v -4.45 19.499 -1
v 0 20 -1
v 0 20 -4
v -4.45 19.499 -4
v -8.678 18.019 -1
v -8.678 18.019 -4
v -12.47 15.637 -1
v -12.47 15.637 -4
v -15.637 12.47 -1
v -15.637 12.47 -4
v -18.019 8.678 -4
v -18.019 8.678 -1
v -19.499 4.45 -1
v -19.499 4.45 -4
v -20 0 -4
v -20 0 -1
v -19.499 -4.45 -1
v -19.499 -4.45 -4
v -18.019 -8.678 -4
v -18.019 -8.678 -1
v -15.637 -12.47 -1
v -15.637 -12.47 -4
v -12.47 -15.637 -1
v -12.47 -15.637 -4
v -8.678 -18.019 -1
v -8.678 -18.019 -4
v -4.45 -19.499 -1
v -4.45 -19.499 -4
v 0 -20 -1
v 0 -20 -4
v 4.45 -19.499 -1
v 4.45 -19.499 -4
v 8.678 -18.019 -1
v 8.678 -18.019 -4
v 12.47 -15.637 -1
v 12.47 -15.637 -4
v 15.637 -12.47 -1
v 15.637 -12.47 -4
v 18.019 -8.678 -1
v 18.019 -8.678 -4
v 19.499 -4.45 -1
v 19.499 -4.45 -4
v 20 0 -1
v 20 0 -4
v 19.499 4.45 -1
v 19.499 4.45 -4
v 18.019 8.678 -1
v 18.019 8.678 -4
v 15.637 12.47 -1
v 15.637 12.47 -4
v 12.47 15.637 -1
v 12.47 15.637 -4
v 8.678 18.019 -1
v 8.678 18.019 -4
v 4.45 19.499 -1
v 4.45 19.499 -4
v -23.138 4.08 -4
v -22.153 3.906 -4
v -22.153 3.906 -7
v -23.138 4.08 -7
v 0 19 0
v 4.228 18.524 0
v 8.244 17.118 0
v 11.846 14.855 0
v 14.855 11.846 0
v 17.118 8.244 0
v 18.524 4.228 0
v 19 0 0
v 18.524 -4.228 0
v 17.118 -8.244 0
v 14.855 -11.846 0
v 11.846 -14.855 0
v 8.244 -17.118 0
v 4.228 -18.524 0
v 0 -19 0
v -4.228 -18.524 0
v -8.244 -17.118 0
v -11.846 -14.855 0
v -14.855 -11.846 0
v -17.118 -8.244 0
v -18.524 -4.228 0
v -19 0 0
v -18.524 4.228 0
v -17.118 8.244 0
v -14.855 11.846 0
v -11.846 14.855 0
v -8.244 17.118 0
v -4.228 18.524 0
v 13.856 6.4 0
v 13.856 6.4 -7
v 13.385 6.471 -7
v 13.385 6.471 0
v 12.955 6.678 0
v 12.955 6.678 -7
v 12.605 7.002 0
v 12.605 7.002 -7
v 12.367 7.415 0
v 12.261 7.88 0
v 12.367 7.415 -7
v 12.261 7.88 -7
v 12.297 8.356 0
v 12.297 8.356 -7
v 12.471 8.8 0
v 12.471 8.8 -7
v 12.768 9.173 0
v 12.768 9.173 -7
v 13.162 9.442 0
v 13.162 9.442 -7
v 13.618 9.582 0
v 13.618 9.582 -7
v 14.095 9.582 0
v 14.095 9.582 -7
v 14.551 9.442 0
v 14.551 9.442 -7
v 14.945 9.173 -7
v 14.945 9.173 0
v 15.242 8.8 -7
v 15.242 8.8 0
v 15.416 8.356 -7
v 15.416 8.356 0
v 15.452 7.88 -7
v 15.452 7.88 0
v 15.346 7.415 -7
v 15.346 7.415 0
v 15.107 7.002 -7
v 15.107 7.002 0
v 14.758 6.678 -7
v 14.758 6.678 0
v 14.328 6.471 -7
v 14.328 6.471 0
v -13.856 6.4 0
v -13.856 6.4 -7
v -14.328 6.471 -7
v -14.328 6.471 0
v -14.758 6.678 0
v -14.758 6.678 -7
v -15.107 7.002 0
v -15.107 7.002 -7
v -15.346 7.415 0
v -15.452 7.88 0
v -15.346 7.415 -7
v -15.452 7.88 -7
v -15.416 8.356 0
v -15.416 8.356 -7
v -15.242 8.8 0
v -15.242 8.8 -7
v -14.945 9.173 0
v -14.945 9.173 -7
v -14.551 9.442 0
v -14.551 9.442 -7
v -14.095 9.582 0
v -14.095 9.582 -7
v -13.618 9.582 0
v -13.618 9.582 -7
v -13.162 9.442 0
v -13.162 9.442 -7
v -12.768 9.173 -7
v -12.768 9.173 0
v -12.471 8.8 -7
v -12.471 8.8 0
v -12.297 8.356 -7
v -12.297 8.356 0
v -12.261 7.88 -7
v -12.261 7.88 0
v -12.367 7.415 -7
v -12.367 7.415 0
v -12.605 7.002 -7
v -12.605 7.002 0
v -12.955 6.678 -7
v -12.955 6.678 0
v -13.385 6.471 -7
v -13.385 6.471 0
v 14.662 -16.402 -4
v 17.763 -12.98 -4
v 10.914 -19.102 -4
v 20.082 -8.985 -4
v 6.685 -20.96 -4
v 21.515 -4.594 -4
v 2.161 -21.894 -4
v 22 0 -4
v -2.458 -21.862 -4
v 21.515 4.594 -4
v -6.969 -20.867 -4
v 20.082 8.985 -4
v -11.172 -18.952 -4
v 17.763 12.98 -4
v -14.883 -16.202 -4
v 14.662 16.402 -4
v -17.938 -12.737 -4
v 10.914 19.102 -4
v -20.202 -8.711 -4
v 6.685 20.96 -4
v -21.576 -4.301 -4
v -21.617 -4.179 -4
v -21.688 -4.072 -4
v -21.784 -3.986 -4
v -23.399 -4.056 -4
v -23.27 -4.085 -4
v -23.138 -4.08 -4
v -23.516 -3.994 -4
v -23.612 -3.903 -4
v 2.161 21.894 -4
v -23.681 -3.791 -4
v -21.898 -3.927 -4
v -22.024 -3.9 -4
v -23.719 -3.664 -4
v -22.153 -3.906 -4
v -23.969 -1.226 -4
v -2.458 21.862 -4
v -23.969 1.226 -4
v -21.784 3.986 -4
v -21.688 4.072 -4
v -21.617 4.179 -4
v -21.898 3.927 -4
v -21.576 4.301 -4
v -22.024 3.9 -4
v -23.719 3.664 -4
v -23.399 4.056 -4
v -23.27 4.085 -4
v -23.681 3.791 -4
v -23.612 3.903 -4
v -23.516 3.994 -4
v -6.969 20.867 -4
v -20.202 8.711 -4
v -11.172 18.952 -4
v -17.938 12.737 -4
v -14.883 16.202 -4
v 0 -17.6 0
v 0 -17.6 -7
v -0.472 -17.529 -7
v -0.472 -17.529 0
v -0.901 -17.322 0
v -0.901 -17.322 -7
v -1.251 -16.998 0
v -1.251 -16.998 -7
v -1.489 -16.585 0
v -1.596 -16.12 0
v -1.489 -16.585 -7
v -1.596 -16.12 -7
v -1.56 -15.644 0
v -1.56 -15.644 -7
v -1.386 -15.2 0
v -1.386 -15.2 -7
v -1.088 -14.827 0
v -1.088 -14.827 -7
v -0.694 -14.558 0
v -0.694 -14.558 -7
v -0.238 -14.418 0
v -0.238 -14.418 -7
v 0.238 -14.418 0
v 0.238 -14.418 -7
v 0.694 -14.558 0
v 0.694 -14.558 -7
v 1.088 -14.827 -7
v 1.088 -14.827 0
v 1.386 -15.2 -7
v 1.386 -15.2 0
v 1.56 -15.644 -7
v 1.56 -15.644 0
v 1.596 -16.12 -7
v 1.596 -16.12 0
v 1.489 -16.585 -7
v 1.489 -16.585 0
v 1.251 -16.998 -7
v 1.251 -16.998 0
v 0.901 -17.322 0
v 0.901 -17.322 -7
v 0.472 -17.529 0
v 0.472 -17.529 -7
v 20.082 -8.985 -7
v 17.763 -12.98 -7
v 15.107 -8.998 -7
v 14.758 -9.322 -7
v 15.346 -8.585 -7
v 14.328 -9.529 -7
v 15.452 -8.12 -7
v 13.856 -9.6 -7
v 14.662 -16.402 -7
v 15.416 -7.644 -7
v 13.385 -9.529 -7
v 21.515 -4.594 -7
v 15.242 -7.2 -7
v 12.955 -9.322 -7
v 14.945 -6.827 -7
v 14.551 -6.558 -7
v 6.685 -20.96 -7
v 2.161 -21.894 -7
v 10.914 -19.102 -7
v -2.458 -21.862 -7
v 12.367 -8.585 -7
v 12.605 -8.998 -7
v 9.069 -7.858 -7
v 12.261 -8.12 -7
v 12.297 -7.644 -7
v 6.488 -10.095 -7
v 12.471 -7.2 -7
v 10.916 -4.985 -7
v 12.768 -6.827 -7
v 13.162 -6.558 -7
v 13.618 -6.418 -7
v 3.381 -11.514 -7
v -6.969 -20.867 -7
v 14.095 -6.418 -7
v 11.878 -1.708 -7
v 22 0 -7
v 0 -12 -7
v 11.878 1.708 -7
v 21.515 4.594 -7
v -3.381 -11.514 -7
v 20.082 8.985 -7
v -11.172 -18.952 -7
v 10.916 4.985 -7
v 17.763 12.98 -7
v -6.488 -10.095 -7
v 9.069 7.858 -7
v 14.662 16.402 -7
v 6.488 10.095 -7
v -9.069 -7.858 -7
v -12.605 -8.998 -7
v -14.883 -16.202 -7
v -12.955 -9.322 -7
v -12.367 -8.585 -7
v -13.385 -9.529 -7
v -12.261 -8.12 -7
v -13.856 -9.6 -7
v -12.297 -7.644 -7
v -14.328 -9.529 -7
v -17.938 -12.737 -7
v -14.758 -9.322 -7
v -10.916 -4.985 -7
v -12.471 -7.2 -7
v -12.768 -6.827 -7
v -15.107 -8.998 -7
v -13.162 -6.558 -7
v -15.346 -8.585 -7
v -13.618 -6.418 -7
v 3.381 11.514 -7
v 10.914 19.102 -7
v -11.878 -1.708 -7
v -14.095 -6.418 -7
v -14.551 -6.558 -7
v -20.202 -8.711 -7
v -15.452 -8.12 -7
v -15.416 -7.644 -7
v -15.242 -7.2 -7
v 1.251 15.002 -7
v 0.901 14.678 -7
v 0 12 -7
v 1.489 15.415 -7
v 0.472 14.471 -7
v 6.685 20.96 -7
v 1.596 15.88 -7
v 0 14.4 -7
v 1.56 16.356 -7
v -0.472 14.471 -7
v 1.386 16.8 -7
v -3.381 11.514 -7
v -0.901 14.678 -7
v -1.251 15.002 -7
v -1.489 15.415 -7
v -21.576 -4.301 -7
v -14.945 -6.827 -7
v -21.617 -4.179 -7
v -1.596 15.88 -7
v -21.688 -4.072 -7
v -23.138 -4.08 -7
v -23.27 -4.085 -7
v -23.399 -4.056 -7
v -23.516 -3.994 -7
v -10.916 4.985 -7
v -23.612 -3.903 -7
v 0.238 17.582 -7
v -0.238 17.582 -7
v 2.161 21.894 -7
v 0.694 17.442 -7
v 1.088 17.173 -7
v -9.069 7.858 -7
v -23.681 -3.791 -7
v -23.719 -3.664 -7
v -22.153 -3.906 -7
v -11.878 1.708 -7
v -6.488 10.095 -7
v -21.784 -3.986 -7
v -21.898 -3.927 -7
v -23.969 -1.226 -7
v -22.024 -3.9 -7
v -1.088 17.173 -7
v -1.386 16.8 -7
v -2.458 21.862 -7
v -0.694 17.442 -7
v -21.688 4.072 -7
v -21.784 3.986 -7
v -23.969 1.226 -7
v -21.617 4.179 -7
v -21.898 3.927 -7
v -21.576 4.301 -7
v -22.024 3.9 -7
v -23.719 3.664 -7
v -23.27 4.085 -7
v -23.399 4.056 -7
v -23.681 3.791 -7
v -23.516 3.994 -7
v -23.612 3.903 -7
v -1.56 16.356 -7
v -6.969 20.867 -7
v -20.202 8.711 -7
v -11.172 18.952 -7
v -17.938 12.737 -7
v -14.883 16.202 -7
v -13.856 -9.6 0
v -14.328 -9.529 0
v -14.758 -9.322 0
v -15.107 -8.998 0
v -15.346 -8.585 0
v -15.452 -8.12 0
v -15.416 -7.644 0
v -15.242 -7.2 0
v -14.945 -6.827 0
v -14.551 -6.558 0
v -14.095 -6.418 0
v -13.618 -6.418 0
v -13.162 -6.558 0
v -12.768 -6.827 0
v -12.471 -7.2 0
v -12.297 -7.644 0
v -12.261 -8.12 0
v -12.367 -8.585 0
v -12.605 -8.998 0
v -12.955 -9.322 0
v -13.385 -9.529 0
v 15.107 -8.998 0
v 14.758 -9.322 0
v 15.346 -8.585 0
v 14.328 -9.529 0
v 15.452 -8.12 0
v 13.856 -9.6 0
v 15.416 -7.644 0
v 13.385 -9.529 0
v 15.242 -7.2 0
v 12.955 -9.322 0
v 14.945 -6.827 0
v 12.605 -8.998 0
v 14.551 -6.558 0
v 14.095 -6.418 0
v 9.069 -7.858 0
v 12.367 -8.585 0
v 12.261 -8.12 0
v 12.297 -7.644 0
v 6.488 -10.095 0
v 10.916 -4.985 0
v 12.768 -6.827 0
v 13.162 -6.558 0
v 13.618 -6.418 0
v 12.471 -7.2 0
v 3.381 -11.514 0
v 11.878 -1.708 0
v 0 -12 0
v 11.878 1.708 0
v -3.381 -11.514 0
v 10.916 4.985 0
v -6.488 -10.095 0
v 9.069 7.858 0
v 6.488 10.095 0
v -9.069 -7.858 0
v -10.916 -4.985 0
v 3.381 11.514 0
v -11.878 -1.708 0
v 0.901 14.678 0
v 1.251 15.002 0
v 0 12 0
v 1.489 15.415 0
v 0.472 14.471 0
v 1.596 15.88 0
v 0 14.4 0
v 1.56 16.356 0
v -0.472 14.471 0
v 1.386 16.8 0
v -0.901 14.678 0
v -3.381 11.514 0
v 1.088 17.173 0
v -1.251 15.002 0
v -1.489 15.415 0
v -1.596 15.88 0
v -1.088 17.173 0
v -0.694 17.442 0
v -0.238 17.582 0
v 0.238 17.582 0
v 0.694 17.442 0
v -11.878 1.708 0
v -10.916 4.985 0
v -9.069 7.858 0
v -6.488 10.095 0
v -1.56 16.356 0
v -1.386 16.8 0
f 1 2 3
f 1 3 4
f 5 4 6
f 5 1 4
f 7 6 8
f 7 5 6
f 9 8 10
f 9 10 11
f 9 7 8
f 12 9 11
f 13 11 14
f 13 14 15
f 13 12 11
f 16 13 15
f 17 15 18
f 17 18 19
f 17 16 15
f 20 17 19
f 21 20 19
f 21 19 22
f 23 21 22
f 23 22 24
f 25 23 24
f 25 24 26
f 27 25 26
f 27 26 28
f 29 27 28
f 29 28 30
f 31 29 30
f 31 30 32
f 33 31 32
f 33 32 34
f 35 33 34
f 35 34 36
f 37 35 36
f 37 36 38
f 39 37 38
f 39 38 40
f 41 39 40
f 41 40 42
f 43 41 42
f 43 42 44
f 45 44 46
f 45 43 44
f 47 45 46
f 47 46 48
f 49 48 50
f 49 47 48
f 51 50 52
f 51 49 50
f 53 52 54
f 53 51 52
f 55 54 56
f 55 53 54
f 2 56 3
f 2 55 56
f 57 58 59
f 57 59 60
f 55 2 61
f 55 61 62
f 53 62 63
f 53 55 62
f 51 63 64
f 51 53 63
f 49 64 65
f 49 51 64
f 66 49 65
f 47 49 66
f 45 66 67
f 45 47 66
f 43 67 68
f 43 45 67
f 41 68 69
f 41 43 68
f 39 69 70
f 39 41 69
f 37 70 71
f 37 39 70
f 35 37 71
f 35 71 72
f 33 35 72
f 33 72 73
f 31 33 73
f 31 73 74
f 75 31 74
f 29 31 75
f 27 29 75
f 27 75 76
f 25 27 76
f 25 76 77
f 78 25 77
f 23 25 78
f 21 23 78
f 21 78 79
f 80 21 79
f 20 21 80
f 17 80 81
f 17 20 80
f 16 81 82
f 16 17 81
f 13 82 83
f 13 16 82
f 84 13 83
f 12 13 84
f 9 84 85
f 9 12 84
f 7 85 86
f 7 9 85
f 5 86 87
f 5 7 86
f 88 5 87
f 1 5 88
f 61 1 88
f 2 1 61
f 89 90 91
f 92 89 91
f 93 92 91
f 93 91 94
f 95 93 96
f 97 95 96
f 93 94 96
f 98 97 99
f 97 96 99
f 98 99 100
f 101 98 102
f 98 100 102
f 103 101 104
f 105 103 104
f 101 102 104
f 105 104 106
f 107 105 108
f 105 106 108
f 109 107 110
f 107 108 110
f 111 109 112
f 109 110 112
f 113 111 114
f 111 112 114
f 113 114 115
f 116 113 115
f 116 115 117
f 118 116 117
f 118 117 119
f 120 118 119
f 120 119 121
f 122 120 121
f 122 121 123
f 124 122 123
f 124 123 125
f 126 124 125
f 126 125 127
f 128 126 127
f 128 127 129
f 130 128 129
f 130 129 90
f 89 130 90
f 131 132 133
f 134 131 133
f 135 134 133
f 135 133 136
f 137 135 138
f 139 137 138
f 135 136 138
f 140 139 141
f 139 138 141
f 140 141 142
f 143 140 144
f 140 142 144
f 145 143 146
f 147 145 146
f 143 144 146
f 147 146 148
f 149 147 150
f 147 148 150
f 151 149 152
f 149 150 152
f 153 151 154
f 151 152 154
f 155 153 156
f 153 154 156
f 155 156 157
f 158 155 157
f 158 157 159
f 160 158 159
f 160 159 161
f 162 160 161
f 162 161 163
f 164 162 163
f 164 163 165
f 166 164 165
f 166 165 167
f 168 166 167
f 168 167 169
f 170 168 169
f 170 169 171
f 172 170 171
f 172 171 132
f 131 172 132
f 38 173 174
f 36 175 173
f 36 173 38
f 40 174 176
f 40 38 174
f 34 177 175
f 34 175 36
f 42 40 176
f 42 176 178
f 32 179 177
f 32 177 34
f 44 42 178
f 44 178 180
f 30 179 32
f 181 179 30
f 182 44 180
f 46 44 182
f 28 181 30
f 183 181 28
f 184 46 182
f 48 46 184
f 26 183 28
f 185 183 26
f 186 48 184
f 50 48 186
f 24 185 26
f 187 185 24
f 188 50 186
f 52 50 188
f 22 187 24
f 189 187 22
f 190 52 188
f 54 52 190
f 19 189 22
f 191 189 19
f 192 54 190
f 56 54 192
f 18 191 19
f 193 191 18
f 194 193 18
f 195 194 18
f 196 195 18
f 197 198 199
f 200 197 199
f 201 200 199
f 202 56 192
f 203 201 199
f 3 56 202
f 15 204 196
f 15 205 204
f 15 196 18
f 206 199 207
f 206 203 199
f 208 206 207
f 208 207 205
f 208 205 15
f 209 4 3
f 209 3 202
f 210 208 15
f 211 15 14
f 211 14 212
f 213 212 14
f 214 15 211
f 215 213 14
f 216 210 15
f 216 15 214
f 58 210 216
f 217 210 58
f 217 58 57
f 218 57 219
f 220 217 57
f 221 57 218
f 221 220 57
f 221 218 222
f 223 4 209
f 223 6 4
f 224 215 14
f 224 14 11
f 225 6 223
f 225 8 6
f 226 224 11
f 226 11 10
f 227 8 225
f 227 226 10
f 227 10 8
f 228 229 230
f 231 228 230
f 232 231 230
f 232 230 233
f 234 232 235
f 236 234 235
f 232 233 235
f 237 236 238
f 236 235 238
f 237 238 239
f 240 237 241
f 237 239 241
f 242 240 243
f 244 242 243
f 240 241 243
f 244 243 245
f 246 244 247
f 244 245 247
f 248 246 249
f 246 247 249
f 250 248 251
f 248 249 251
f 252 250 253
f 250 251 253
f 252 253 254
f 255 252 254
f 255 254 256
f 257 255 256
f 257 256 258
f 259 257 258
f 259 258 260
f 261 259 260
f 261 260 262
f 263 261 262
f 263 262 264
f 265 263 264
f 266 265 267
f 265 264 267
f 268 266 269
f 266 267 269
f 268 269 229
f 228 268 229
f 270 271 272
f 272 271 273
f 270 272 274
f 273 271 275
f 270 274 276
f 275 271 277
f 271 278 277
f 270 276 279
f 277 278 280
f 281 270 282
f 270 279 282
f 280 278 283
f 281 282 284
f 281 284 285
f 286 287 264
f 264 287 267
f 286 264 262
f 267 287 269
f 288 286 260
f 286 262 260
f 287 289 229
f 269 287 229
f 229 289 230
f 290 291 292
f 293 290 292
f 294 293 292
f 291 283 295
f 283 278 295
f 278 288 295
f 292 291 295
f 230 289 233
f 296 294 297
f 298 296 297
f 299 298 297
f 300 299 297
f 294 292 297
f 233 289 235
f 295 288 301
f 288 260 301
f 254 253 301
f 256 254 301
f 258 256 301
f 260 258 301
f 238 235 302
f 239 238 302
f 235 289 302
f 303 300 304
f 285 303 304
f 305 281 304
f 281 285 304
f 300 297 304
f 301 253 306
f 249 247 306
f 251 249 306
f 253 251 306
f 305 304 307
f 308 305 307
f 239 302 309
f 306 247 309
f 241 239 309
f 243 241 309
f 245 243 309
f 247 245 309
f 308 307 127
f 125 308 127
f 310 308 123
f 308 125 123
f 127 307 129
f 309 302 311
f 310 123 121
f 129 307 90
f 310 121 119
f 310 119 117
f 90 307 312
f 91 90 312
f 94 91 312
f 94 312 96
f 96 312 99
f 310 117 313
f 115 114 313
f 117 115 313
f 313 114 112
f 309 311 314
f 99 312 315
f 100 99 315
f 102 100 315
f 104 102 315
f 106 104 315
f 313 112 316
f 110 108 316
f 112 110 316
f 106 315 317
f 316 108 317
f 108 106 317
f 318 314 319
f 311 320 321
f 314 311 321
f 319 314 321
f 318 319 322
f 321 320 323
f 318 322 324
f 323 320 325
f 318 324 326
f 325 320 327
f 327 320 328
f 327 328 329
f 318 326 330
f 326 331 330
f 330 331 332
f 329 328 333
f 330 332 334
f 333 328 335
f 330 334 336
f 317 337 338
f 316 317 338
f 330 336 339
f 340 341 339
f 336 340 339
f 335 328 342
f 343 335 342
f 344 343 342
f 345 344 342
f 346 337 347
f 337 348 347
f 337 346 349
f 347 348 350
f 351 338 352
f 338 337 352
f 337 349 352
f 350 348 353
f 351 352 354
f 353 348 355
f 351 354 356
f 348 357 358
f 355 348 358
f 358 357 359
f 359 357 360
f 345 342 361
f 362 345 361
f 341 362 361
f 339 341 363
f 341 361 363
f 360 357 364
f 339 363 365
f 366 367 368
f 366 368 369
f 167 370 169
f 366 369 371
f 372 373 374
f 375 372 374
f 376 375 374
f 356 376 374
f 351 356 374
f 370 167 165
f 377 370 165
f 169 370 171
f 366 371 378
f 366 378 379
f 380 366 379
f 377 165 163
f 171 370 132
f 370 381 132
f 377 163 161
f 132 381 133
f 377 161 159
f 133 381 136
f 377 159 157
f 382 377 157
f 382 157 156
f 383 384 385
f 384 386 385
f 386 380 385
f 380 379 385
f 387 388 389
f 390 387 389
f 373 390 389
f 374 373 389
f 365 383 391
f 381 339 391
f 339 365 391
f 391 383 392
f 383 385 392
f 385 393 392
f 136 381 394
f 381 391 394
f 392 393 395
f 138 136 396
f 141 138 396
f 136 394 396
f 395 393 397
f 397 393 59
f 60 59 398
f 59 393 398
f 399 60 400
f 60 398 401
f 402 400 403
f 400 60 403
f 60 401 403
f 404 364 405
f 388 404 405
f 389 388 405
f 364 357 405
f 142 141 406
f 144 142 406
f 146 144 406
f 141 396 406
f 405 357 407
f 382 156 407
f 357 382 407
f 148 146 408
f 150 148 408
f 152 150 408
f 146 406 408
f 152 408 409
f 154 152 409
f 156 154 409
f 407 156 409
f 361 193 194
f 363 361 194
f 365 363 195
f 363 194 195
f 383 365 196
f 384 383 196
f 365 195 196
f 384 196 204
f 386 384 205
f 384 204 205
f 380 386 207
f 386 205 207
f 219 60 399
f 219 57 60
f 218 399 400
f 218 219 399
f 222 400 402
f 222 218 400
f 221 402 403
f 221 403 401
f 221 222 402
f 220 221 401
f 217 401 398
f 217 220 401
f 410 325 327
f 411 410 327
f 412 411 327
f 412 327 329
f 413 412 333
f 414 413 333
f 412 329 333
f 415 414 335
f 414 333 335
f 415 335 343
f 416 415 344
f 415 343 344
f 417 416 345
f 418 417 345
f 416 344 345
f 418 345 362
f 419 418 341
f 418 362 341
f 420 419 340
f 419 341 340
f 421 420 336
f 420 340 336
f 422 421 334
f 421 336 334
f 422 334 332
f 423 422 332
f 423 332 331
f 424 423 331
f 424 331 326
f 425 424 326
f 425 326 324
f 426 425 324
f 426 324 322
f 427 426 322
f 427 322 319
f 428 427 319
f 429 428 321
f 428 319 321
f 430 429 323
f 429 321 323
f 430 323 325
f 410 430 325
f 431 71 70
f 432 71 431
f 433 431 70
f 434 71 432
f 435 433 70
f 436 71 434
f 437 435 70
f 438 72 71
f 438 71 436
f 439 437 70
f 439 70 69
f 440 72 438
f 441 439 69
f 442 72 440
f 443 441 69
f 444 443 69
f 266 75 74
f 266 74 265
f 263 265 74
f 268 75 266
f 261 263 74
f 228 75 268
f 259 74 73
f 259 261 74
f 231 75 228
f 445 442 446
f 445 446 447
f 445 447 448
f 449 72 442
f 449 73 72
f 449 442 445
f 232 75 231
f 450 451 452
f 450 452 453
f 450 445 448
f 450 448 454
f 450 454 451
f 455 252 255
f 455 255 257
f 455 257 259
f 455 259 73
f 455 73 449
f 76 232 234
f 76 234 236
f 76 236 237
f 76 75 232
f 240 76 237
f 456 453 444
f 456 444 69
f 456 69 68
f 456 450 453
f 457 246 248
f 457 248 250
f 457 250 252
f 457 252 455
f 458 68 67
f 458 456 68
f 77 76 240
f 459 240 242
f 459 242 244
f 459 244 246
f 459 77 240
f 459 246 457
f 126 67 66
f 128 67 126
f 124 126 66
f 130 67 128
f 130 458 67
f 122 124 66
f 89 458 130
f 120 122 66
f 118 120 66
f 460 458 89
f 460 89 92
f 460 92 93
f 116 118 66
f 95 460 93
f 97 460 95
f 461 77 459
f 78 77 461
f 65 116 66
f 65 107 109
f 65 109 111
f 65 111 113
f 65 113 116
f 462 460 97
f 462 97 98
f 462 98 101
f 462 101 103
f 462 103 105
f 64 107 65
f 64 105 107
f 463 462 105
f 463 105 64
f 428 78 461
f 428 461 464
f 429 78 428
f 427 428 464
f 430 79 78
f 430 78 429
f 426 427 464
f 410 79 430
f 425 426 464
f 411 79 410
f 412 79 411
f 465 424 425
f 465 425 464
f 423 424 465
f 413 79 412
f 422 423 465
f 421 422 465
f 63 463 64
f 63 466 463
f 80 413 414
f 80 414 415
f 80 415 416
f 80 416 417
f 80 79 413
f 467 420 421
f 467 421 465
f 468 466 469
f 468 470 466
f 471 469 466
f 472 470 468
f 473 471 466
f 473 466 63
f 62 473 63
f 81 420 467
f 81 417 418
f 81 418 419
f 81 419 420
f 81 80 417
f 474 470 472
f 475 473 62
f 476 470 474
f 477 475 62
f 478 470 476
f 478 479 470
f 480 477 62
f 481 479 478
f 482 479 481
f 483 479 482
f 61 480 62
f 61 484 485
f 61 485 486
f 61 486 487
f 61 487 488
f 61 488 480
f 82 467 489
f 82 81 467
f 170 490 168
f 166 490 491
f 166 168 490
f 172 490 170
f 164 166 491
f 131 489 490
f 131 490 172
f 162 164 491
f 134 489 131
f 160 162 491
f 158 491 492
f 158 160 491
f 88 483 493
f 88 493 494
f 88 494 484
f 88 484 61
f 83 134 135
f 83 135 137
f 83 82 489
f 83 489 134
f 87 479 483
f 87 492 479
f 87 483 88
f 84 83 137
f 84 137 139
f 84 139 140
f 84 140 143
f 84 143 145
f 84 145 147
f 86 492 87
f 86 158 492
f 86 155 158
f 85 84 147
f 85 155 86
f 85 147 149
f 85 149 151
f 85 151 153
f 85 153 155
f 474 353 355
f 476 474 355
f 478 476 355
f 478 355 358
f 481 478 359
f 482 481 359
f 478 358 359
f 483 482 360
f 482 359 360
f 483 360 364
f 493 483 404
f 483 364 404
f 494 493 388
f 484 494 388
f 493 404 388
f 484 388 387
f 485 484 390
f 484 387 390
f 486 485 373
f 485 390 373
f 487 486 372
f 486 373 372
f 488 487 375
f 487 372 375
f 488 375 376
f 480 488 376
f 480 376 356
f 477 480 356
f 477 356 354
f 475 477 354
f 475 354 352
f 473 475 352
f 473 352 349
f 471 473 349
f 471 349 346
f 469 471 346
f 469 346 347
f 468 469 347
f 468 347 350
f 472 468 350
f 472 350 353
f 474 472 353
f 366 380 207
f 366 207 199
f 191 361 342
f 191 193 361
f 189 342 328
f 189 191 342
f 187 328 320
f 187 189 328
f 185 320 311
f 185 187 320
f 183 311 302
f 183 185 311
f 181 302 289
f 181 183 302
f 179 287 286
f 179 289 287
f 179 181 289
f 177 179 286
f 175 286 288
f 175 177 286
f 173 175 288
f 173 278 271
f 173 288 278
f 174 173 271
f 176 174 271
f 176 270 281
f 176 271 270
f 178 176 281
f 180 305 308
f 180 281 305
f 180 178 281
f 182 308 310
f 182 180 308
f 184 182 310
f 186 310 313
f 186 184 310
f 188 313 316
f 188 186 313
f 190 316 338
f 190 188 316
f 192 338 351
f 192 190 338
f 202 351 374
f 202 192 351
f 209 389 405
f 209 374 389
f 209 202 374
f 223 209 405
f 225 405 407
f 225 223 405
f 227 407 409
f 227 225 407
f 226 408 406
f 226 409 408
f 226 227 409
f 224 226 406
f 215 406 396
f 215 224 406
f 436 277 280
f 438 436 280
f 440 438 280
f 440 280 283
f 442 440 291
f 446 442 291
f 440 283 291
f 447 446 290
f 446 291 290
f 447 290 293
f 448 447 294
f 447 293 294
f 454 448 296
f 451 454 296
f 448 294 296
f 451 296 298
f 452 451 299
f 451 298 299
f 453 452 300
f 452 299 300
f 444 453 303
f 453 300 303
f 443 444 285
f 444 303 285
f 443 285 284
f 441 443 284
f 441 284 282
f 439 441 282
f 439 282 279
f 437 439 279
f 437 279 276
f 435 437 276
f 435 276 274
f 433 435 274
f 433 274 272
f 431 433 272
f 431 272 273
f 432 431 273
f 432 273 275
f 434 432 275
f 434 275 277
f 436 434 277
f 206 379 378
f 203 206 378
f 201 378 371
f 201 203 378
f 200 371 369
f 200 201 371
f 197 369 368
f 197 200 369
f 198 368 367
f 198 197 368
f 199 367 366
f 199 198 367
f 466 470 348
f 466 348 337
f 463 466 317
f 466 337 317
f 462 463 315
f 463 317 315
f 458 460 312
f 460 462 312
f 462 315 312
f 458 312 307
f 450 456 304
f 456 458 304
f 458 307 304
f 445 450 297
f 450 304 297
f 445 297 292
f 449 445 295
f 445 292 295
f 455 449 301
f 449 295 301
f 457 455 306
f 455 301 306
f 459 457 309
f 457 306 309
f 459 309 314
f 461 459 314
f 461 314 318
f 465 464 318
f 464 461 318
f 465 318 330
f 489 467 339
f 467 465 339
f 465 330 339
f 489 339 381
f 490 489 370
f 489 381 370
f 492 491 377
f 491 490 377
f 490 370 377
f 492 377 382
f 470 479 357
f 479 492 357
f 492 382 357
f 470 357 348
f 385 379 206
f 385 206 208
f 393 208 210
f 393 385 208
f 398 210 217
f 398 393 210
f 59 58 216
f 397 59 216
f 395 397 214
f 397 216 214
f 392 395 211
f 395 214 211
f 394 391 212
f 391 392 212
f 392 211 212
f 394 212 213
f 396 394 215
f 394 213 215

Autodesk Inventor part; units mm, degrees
ref_plane "YZ Plane" through (0, 0, 0) normal (1, 0, 0) x (0, 1, 0)
ref_plane "XZ Plane" through (0, 0, 0) normal (0, 1, 0) x (-1, 0, 0)
ref_plane "XY Plane" through (0, 0, 0) normal (0, 0, 1) x (1, 0, 0)
sketch "スケッチ1" plane through (0, 0, 0) normal (1, 0, 0) x (0, 1, 0)
  line L0 (12, 0) -> (12, -7)
  line L1 (22, -7) -> (22, -4)
  line L2 (22, -4) -> (20, -4)
  line L3 (20, -4) -> (20, 0)
  line L4 (20, 0) -> (12, 0)
  line L5 (0, -8.4) -> (0, 1.4) projected
  line L6 (22, -7) -> (12, -7)
  point P0 (0, 0)
  dimension "d0" = 20
  dimension "d1" = 2
  dimension "d2" = 4
  dimension "d3" = 3
  dimension "d4" = 8
revolve "回転1" add sketch "スケッチ1" angle 360 about axis through (0, 0, -10) along (0, 0, 1)
sketch "スケッチ2" plane through (0, 0, 0) normal (0, 0, 1) x (1, 0, 0)
  circle A0 centre (0, 0) radius 20 projected
  circle A1 centre (0, 0) radius 16
  point P0 (0, 16)
  point P1 (-13.8564, 8)
  point P2 (-13.8564, -8)
  point P3 (0, -16)
  point P4 (13.8564, -8)
  point P5 (13.8564, 8)
  dimension "d8" = 4
  dimension "d11" = 360
hole "穴1" at (0, 16, 0) at (-13.8564, 8, 0) at (-13.8564, -8, 0) at (0, -16, 0) at (13.8564, -8, 0) at (13.8564, 8, 0) direction (0, 0, -1) diameter 3.2 end through all clearance for "Socket Head Cap Screw" size "M3" standard "Ansi Metric M Profile"
chamfer "面取り1" distance 1 angle 45 1 edges at (0, -20, 0)
sketch "スケッチ3" plane through (0, 0, -7) normal (0, 0, -1) x (-1, 0, 0)
  circle A0 centre (0, 0) radius 22 projected
  circle A1 centre (0, 0) radius 24
  line L0 (0, 0) -> (23.6354, -4.1676)
  line L1 (0, 0) -> (23.6354, 4.1676)
  line L2 (-35, 0) -> (35, 0) projected
  point P0 (21.6658, -3.8203)
  point P1 (21.6658, 3.8203)
  dimension "d23" = 2
  dimension "d24" = 10
  dimension "d25" = 10
extrude "押し出し1" add sketch "スケッチ3" against normal up to surface (3 mm away) contours L2 A1 L0 A0 | A0 L1 A1 L2 picked at (23.0463, -3.5914) picked at (23.1081, 3.1693)
fillet "フィレット1" radius 0.5 4 edges at (-23.6354, -4.1676, -5.5) (-21.6658, -3.8203, -5.5) (-23.6354, 4.1676, -5.5) (-21.6658, 3.8203, -5.5)
equation "\"d25\" = d24"
properties part number "base11" material "ABS プラスチック"
